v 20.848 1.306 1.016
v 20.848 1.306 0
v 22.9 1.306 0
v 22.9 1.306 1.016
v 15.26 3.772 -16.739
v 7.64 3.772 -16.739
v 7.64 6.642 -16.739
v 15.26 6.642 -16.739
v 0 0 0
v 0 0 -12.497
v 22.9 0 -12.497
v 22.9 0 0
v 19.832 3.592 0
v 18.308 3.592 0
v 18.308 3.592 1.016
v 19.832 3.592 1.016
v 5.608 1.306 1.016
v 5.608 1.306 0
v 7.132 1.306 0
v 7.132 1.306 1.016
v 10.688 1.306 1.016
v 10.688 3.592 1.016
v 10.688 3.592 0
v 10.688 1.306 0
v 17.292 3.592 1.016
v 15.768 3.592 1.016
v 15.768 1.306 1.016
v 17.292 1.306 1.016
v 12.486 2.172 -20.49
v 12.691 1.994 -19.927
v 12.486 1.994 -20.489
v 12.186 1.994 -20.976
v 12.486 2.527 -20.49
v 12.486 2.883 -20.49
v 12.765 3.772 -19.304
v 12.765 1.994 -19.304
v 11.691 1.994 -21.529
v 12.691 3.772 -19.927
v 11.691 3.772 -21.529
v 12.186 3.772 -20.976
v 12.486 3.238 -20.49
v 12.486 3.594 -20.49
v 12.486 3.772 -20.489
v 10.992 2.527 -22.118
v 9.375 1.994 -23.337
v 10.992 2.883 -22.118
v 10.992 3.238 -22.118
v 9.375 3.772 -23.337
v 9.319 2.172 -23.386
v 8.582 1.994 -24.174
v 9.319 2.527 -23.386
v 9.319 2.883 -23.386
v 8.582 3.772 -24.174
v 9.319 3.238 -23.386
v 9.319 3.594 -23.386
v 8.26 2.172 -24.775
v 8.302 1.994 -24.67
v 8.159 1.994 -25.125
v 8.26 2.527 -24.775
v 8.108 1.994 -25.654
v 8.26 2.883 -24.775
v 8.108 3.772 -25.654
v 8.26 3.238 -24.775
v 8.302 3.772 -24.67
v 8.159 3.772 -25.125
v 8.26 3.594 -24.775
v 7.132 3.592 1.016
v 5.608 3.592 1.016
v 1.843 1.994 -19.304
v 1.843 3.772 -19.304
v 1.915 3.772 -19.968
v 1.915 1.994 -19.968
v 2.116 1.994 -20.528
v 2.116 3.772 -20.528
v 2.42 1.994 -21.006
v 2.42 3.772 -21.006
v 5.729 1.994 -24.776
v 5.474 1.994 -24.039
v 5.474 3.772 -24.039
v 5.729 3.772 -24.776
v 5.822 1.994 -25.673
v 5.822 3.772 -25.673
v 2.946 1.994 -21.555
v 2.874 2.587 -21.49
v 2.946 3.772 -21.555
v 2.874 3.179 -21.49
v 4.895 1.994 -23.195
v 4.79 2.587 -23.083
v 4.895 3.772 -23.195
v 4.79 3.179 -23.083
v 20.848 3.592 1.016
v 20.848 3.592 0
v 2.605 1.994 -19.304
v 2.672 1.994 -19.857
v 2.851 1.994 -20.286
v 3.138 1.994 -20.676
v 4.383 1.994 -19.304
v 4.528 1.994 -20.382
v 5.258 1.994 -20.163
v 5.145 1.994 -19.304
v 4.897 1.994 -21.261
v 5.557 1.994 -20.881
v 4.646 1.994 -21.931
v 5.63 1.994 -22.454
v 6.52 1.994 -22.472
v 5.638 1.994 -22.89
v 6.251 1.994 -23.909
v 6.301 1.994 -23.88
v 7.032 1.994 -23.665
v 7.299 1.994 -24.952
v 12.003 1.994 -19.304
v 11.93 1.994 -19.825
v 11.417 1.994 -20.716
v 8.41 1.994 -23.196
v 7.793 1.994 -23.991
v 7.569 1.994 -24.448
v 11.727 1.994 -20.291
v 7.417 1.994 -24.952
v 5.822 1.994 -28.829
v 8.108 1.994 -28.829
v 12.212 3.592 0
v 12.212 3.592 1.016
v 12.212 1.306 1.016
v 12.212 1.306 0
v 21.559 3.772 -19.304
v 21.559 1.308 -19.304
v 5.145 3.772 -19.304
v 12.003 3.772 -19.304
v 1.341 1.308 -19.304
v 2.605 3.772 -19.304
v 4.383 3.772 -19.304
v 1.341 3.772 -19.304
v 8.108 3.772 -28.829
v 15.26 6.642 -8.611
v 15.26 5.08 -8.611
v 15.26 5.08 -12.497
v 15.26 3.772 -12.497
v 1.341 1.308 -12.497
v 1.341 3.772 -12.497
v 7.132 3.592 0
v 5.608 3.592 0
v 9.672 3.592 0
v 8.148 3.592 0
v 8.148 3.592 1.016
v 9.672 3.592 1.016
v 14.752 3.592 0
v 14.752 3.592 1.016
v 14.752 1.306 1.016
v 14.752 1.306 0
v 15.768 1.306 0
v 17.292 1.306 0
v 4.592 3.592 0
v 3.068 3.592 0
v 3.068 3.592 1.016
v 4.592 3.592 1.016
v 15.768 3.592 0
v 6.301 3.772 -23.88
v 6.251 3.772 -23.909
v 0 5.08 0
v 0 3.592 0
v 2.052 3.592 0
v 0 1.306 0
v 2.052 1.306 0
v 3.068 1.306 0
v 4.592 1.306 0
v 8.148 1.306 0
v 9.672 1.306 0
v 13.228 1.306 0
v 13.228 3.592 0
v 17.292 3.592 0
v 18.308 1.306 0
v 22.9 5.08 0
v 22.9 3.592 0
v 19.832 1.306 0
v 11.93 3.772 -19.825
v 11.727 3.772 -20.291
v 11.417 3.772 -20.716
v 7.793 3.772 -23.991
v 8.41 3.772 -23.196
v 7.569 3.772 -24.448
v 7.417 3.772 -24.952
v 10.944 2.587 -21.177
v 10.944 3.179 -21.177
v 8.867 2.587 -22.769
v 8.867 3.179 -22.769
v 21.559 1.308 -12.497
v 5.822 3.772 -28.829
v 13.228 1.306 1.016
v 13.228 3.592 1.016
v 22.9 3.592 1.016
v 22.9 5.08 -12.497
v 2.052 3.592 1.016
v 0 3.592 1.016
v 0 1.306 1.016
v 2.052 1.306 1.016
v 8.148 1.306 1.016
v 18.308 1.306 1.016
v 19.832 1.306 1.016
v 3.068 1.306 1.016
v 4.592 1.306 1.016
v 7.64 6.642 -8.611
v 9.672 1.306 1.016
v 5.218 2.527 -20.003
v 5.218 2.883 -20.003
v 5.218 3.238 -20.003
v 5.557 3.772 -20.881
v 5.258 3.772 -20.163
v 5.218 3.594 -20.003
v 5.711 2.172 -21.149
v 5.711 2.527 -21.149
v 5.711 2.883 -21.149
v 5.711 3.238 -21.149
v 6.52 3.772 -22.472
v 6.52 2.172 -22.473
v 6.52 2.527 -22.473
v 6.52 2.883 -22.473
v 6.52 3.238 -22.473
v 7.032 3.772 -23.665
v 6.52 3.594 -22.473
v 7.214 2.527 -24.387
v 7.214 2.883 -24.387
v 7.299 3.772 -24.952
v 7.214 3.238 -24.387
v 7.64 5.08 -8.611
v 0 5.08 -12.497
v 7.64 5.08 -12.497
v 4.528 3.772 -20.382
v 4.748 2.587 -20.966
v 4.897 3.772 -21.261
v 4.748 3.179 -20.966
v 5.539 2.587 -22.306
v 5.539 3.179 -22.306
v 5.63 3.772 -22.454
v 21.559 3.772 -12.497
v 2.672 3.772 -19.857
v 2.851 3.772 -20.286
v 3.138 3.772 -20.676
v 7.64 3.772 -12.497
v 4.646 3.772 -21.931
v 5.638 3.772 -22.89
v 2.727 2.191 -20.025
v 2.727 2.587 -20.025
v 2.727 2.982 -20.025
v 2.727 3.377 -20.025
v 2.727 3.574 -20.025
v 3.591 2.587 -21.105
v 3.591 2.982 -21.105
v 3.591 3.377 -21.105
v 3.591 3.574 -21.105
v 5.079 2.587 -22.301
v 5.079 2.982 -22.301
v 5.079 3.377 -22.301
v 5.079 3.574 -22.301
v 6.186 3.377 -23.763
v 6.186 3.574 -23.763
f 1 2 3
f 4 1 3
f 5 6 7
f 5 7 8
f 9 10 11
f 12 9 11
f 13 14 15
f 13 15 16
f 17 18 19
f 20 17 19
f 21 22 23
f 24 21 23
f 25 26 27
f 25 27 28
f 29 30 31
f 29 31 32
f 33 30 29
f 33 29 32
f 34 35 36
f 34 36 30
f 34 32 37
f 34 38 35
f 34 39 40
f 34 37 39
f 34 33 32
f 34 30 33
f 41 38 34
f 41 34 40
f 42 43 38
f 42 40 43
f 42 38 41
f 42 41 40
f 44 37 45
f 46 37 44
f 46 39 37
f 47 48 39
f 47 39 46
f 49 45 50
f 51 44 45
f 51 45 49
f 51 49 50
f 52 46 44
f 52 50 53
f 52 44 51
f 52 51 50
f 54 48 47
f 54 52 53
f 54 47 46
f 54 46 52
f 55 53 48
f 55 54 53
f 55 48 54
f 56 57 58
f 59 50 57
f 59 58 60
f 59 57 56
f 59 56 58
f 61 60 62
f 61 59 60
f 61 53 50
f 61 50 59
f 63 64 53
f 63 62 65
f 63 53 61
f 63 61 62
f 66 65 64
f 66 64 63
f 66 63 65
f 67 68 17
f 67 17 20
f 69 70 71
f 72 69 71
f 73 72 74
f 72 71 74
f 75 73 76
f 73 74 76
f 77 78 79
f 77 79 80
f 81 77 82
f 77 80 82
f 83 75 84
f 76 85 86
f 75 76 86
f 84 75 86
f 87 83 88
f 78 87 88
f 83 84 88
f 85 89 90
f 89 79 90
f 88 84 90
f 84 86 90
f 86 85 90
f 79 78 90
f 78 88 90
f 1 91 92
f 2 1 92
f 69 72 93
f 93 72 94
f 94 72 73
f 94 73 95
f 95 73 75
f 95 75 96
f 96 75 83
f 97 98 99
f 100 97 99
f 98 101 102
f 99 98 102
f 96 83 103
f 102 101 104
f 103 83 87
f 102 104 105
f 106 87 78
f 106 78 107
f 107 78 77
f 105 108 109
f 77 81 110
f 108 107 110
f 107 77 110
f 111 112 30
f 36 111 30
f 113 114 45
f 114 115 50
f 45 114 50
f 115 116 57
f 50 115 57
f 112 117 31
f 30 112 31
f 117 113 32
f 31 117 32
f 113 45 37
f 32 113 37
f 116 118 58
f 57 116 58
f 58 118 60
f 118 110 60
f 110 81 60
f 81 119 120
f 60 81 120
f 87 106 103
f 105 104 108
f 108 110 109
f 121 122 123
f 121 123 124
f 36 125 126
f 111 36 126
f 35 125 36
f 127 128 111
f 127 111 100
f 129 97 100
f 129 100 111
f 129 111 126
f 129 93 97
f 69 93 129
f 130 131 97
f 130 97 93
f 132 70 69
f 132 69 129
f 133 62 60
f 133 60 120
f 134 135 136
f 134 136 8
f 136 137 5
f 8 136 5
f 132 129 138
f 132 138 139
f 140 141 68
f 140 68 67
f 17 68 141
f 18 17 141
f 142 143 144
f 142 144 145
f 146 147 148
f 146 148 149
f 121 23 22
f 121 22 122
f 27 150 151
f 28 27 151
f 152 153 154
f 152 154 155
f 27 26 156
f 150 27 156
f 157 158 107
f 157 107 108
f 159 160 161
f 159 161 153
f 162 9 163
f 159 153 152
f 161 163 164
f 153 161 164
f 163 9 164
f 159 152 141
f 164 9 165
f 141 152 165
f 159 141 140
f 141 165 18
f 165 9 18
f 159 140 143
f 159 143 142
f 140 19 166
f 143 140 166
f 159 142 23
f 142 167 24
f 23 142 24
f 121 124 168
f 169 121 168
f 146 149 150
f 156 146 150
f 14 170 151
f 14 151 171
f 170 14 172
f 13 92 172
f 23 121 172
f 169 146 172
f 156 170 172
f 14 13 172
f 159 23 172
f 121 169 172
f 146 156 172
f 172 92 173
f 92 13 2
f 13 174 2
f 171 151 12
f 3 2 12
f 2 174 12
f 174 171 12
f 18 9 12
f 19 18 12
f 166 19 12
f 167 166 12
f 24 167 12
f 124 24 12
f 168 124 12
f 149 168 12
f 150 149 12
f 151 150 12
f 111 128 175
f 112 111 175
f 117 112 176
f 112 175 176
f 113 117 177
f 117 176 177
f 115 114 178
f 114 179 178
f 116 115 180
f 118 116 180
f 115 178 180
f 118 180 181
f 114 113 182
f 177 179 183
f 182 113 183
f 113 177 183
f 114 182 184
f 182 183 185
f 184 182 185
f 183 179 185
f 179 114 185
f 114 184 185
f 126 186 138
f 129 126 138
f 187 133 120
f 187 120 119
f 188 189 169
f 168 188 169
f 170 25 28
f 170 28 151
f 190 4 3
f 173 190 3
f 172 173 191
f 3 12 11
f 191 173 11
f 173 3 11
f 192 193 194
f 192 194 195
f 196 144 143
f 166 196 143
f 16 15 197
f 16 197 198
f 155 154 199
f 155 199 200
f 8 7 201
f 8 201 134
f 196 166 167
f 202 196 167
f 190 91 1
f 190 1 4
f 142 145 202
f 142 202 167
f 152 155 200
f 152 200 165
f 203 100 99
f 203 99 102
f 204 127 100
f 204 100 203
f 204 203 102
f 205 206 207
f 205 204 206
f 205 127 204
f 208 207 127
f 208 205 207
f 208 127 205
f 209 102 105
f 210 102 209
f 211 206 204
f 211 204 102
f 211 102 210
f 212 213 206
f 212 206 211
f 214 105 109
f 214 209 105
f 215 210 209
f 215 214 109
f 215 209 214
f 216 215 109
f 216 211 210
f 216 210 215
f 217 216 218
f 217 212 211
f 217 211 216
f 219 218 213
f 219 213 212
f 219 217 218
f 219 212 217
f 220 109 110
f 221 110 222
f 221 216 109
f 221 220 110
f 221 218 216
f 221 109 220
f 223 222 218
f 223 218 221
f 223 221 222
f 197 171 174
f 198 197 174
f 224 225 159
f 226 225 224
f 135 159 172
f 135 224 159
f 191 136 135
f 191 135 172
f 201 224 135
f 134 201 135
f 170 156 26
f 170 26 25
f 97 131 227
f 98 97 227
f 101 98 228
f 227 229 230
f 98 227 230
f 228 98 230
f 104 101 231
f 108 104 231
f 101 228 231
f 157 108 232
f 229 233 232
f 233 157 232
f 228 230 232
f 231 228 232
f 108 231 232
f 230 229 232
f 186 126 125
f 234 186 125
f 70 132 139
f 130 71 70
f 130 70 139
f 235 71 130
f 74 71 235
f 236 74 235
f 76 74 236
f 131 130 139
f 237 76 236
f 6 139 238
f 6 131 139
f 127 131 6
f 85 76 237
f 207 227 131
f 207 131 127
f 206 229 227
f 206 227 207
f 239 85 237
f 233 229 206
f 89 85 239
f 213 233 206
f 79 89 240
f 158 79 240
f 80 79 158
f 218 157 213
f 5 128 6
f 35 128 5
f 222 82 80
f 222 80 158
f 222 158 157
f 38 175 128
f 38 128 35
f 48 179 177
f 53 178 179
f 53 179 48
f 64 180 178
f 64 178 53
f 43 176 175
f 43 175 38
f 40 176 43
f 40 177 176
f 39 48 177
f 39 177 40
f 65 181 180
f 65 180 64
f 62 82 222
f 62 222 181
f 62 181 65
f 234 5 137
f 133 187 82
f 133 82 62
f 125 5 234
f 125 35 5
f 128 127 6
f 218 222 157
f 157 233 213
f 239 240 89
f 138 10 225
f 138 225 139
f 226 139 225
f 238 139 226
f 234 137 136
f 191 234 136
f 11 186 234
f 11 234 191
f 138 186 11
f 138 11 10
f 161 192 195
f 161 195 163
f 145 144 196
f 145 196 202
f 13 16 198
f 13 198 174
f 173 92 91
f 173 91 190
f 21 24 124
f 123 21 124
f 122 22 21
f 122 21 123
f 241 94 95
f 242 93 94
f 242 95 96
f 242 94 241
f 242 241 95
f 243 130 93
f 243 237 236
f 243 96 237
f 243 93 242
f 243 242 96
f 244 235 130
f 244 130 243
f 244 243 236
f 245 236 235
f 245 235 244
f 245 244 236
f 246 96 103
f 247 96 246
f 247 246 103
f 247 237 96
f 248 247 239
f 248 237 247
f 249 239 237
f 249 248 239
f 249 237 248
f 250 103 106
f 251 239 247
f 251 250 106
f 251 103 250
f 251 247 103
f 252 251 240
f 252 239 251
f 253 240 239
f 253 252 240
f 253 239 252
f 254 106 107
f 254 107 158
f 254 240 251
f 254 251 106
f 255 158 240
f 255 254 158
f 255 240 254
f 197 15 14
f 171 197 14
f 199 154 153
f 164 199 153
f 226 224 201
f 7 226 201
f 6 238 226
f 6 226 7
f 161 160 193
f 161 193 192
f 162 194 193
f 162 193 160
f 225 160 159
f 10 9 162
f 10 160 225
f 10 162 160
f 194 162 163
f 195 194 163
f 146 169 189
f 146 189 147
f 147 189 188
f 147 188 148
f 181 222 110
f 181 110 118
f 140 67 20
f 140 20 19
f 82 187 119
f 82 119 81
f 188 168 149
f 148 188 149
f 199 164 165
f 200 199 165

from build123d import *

# Parameters (mm, degrees)
SKETCH1_W           = 22.9
SKETCH1_H           = 12.4968
BOSS_EXTRUDE1_DEPTH = 5.08
SKETCH2_W           = 22.9
SKETCH2_H           = 2.286
BOSS_EXTRUDE2_DEPTH = 1.016
SKETCH3_W           = 1.016
SKETCH3_H           = 1.016
CUT_EXTRUDE1_DEPTH  = 27.577930887
SKETCH4_W           = 20.2184
SKETCH4_H           = 2.4638
BOSS_EXTRUDE3_DEPTH = 6.8072
SKETCH5_W           = 7.62
SKETCH5_H           = 8.128
BOSS_EXTRUDE4_DEPTH = 2.8702
BOSS_EXTRUDE6_DEPTH = 1.778


with BuildPart() as part:
    # Sketch1 → Boss-Extrude1 (new body)
    with BuildSketch(Plane(origin=(0, 0, 0), x_dir=(1, 0, 0), z_dir=(0, 1, 0))):
        with Locations((11.45, 6.2484)):
            Rectangle(SKETCH1_W, SKETCH1_H)
    extrude(amount=BOSS_EXTRUDE1_DEPTH)

    # Sketch2 → Boss-Extrude2 (add)
    with BuildSketch(Plane.XY):
        with Locations((11.45, 2.449418531)):
            Rectangle(SKETCH2_W, SKETCH2_H)
    extrude(amount=BOSS_EXTRUDE2_DEPTH)

    # Sketch3 → Cut-Extrude1 (cut, through all)
    with BuildSketch(Plane(origin=(0, 5.08, 0), x_dir=(1, 0, 0), z_dir=(0, 1, 0))):
        with Locations((2.56, -0.508)):
            Rectangle(SKETCH3_W, SKETCH3_H)
        with Locations((5.1, -0.508)):
            Rectangle(SKETCH3_W, SKETCH3_H)
        with Locations((7.64, -0.508)):
            Rectangle(SKETCH3_W, SKETCH3_H)
        with Locations((10.18, -0.508)):
            Rectangle(SKETCH3_W, SKETCH3_H)
        with Locations((12.72, -0.508)):
            Rectangle(SKETCH3_W, SKETCH3_H)
        with Locations((15.26, -0.508)):
            Rectangle(SKETCH3_W, SKETCH3_H)
        with Locations((17.8, -0.508)):
            Rectangle(SKETCH3_W, SKETCH3_H)
        with Locations((20.34, -0.508)):
            Rectangle(SKETCH3_W, SKETCH3_H)
    extrude(amount=-CUT_EXTRUDE1_DEPTH, mode=Mode.SUBTRACT)

    # Sketch4 → Boss-Extrude3 (add)
    with BuildSketch(Plane(origin=(0, 0, -12.4968), x_dir=(-1, 0, 0), z_dir=(0, 0, -1))):
        with Locations((-11.45, 2.54)):
            Rectangle(SKETCH4_W, SKETCH4_H)
    extrude(amount=BOSS_EXTRUDE3_DEPTH)

    # Sketch5 → Boss-Extrude4 (add)
    with BuildSketch(Plane(origin=(0, 3.7719, 0), x_dir=(1, 0, 0), z_dir=(0, 1, 0))):
        with Locations((11.45, 12.6746)):
            Rectangle(SKETCH5_W, SKETCH5_H)
    extrude(amount=BOSS_EXTRUDE4_DEPTH)

    # Sketch6 → Boss-Extrude6 (add)
    # profile 1 of 4: a face of its own
    with BuildSketch(Plane(origin=(0, 3.7719, 0), x_dir=(1, 0, 0), z_dir=(0, 1, 0))):
        with BuildLine():
            add(Edge.make_bspline(
                [(12.764837987, 19.304), (12.764837987, 19.513213272), (12.713813556, 19.940397022), (12.430473546, 20.689983513), (11.84369856, 21.434451274), (10.99868157, 22.128872758), (10.114149769, 22.755114216), (9.290977221, 23.379772734), (8.634141686, 24.039902479), (8.28695824, 24.637071385), (8.136269303, 25.170420647), (8.107573693, 25.497240703), (8.107573693, 25.654)],
                knots=[0, 0, 0, 0, 0.0625, 0.125, 0.25, 0.375, 0.5, 0.625, 0.75, 0.875, 0.9375, 1, 1, 1, 1], degree=3))
            Line((8.107573693, 25.654), (8.107573693, 28.829))
            Line((8.107573693, 28.829), (5.821803018, 28.829))
            Line((5.821803018, 28.829), (5.821803018, 25.672693301))
            add(Edge.make_bspline(
                [(1.842837987, 19.304), (1.842837987, 22.316040756), (5.821803018, 22.055802608), (5.821803018, 25.672693301)],
                knots=[0, 0, 0, 0, 1, 1, 1, 1], degree=3))
            Line((1.842837987, 19.304), (2.604837987, 19.304))
            add(Edge.make_bspline(
                [(2.604837987, 19.304), (2.604837987, 19.436184229), (2.628829628, 19.717403115), (2.748821923, 20.134038551), (3.017012948, 20.581214899), (3.561863063, 21.101594101), (4.28319589, 21.642805815), (5.083141911, 22.269605528), (5.750459382, 22.975833182), (6.10677757, 23.58043805), (6.230115453, 23.859247989), (6.250774433, 23.908581669)],
                knots=[0, 0, 0, 0, 0.0625, 0.125, 0.25, 0.375, 0.5, 0.625, 0.75, 0.824094442, 0.839719442, 0.839719442, 0.839719442, 0.839719442], degree=3))
            add(Edge.make_bspline(
                [(6.250774433, 23.908581669), (6.271433413, 23.95791535), (6.316227133, 24.071064885), (6.41779978, 24.365489751), (6.480855857, 24.623522586), (6.514810758, 24.824299603)],
                knots=[0.839719442, 0.839719442, 0.839719442, 0.839719442, 0.855344442, 0.875, 0.928476516, 0.928476516, 0.928476516, 0.928476516], degree=3))
            add(Edge.make_bspline(
                [(6.300749052, 23.880300217), (6.391194329, 24.164866019), (6.464932294, 24.476628676), (6.514810758, 24.824299603)],
                knots=[0.790040378, 0.790040378, 0.790040378, 0.790040378, 0.909912617, 0.909912617, 0.909912617, 0.909912617], degree=3))
            add(Edge.make_bspline(
                [(4.382837987, 19.304), (4.382837987, 21.310686016), (5.704652562, 22.004816166), (6.300749052, 23.880300217)],
                knots=[0, 0, 0, 0, 0.790040378, 0.790040378, 0.790040378, 0.790040378], degree=3))
            Line((4.382837987, 19.304), (5.144837987, 19.304))
            add(Edge.make_bspline(
                [(5.144837987, 19.304), (5.144837987, 19.427793819), (5.158559892, 19.685949652), (5.231289869, 20.113666624), (5.394061657, 20.587818607), (5.695490865, 21.140525626), (6.088197228, 21.743923542), (6.524741922, 22.447977177), (6.93514926, 23.302596179), (7.174536626, 24.122966736), (7.269542471, 24.705079276), (7.293215165, 24.899470513), (7.299029307, 24.951977964)],
                knots=[0, 0, 0, 0, 0.0625, 0.125, 0.25, 0.375, 0.5, 0.625, 0.75, 0.875, 0.918103341, 0.933728341, 0.933728341, 0.933728341, 0.933728341], degree=3))
            add(Edge.make_bspline(
                [(7.299029307, 24.951977964), (7.304843448, 25.004485416), (7.327450173, 25.230534496), (7.341165481, 25.474360975), (7.345573693, 25.654)],
                knots=[0.933728341, 0.933728341, 0.933728341, 0.933728341, 0.949353341, 1, 1, 1, 1], degree=3))
            add(Edge.make_bspline(
                [(7.417250324, 24.951977964), (7.370695979, 25.171529954), (7.345573693, 25.404885005), (7.345573693, 25.654)],
                knots=[0.926554678, 0.926554678, 0.926554678, 0.926554678, 1, 1, 1, 1], degree=3))
            add(Edge.make_bspline(
                [(12.002837987, 19.304), (12.002837987, 21.609223862), (8.004559962, 22.182204254), (7.417250324, 24.951977964)],
                knots=[0, 0, 0, 0, 0.926554678, 0.926554678, 0.926554678, 0.926554678], degree=3))
            Line((12.002837987, 19.304), (12.764837987, 19.304))
        make_face()
        with BuildLine():
            add(Edge.make_bspline(
                [(6.514810758, 24.824299603), (6.520540217, 24.858178177), (6.563211161, 25.129441995), (6.583803018, 25.423501077), (6.583803018, 25.672693301)],
                knots=[0.928476516, 0.928476516, 0.928476516, 0.928476516, 0.9375, 1, 1, 1, 1], degree=3))
            add(Edge.make_bspline(
                [(6.514810758, 24.824299603), (6.552295837, 25.08558415), (6.576305195, 25.367149502), (6.583803018, 25.672693301)],
                knots=[0.909912617, 0.909912617, 0.909912617, 0.909912617, 1, 1, 1, 1], degree=3))
        make_face(mode=Mode.SUBTRACT)
    # profile 2 of 4: a face of its own
    with BuildSketch(Plane(origin=(0, 3.7719, 0), x_dir=(1, 0, 0), z_dir=(0, 1, 0))):
        with BuildLine():
            Line((7.299029307, 24.951977964), (7.417250324, 24.951977964))
            add(Edge.make_bspline(
                [(7.417250324, 24.951977964), (7.370695979, 25.171529954), (7.345573693, 25.404885005), (7.345573693, 25.654)],
                knots=[0.926554678, 0.926554678, 0.926554678, 0.926554678, 1, 1, 1, 1], degree=3))
            add(Edge.make_bspline(
                [(7.299029307, 24.951977964), (7.304843448, 25.004485416), (7.327450173, 25.230534496), (7.341165481, 25.474360975), (7.345573693, 25.654)],
                knots=[0.933728341, 0.933728341, 0.933728341, 0.933728341, 0.949353341, 1, 1, 1, 1], degree=3))
        make_face()
    # profile 3 of 4: a face of its own
    with BuildSketch(Plane(origin=(0, 3.7719, 0), x_dir=(1, 0, 0), z_dir=(0, 1, 0))):
        with BuildLine():
            Line((6.250774433, 23.908581669), (6.300749052, 23.880300217))
            add(Edge.make_bspline(
                [(6.300749052, 23.880300217), (6.391194329, 24.164866019), (6.464932294, 24.476628676), (6.514810758, 24.824299603)],
                knots=[0.790040378, 0.790040378, 0.790040378, 0.790040378, 0.909912617, 0.909912617, 0.909912617, 0.909912617], degree=3))
            add(Edge.make_bspline(
                [(6.250774433, 23.908581669), (6.271433413, 23.95791535), (6.316227133, 24.071064885), (6.41779978, 24.365489751), (6.480855857, 24.623522586), (6.514810758, 24.824299603)],
                knots=[0.839719442, 0.839719442, 0.839719442, 0.839719442, 0.855344442, 0.875, 0.928476516, 0.928476516, 0.928476516, 0.928476516], degree=3))
        make_face()
    # profile 4 of 4: a face of its own
    with BuildSketch(Plane(origin=(0, 3.7719, 0), x_dir=(1, 0, 0), z_dir=(0, 1, 0))):
        with BuildLine():
            add(Edge.make_bspline(
                [(6.514810758, 24.824299603), (6.552295837, 25.08558415), (6.576305195, 25.367149502), (6.583803018, 25.672693301)],
                knots=[0.909912617, 0.909912617, 0.909912617, 0.909912617, 1, 1, 1, 1], degree=3))
            add(Edge.make_bspline(
                [(6.514810758, 24.824299603), (6.520540217, 24.858178177), (6.563211161, 25.129441995), (6.583803018, 25.423501077), (6.583803018, 25.672693301)],
                knots=[0.928476516, 0.928476516, 0.928476516, 0.928476516, 0.9375, 1, 1, 1, 1], degree=3))
        make_face()
    extrude(amount=-BOSS_EXTRUDE6_DEPTH)


solid = part.part
